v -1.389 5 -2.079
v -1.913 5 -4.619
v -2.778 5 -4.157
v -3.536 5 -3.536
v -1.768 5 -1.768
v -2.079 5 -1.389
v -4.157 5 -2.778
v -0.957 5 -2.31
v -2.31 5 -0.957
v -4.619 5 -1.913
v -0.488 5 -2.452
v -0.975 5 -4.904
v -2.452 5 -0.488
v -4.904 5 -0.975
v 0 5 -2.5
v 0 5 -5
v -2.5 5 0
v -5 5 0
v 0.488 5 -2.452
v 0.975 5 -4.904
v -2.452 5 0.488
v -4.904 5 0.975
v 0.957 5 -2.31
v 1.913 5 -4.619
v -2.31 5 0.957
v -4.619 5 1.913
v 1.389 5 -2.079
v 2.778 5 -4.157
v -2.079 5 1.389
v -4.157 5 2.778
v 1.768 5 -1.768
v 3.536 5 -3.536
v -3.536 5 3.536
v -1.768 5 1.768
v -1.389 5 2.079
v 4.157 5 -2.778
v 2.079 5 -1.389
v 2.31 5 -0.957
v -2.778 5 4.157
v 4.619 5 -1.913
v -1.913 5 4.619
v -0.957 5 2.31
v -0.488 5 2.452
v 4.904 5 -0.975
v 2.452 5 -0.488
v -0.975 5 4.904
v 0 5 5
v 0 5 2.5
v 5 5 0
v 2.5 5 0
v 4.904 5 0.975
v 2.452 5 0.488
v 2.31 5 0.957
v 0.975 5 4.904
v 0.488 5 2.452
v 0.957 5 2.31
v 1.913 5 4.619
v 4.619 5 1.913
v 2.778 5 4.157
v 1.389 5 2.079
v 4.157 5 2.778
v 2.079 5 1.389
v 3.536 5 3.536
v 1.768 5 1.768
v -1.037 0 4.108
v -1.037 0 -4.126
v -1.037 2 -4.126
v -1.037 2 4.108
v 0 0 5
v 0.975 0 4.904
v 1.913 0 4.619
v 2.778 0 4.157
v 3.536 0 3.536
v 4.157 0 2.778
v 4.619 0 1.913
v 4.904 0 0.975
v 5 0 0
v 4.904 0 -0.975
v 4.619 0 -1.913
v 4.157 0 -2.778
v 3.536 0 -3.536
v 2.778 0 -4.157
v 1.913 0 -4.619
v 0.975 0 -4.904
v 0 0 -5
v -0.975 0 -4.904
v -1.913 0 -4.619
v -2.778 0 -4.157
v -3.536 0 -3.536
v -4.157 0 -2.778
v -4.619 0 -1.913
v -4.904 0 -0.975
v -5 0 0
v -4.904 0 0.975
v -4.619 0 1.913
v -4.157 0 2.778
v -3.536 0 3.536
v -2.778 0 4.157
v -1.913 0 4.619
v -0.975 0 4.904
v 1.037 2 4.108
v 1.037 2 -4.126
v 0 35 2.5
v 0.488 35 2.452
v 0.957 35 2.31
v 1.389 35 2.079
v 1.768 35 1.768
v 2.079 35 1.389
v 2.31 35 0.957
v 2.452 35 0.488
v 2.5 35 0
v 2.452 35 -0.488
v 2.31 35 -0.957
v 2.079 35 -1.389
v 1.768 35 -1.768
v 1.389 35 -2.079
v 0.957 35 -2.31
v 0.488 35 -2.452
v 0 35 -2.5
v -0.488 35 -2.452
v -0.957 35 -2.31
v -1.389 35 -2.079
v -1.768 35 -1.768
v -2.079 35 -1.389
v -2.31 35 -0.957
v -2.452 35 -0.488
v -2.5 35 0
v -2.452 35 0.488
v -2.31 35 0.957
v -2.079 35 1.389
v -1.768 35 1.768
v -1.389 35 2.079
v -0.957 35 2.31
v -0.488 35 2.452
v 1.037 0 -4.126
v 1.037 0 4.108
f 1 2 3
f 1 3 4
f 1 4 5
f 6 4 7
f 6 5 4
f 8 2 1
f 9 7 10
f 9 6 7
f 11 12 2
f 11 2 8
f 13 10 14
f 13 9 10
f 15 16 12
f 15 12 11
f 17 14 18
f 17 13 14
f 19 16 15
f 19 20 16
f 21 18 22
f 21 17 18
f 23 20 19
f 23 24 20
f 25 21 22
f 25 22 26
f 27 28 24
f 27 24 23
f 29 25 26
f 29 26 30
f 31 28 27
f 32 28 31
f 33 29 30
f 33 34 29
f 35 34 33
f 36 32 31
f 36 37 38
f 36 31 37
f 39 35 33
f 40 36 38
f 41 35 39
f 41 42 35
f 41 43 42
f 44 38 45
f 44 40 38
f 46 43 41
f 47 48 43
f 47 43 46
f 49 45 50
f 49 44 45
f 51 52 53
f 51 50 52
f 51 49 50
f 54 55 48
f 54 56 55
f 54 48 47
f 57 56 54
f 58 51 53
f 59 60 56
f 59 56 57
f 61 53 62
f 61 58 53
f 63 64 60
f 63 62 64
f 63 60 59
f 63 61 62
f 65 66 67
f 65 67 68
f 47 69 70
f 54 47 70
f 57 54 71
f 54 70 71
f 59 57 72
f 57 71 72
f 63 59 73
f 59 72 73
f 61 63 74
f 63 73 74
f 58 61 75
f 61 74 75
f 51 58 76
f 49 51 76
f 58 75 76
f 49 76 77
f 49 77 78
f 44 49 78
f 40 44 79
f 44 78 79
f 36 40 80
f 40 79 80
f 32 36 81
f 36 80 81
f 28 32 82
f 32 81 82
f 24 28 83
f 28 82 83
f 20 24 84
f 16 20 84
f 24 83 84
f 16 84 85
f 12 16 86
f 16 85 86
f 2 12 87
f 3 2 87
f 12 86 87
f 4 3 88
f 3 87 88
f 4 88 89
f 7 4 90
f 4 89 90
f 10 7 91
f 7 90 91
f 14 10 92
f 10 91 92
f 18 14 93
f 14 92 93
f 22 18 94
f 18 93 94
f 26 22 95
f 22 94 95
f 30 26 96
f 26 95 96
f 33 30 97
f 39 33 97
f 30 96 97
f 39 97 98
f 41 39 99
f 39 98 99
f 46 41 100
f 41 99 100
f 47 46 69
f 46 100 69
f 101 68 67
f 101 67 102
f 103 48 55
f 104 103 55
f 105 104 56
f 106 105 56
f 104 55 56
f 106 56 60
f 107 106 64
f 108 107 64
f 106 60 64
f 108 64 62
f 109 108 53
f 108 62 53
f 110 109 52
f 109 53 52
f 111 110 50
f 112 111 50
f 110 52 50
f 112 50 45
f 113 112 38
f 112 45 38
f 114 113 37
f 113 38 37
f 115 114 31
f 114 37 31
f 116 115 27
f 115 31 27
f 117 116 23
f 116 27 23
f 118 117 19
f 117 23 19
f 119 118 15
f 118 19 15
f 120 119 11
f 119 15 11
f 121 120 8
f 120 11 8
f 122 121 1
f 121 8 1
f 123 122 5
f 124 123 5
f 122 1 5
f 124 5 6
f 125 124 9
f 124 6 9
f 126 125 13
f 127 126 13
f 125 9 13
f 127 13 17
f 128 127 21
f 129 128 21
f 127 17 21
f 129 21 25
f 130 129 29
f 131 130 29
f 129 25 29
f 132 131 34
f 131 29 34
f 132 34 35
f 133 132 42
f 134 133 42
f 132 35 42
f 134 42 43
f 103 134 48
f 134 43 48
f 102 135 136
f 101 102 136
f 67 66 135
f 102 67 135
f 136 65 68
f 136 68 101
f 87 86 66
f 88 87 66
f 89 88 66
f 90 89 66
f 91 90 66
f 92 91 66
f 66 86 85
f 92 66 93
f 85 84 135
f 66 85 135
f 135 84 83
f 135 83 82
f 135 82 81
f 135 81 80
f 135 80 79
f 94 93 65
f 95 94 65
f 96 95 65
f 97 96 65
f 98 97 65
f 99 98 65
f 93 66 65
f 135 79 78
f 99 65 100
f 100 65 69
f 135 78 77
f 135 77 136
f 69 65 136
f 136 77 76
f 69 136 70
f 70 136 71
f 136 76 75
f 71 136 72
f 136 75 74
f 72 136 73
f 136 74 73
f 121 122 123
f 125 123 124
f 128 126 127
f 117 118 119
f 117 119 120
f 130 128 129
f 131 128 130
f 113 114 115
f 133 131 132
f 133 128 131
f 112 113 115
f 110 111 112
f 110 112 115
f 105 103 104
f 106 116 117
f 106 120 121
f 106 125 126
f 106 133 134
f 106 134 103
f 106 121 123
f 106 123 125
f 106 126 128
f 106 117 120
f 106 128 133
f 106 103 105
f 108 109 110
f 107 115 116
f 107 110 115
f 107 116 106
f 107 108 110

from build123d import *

# Parameters (mm, degrees)
SKETCH_1_R          = 5
EXTRUDE_1_DEPTH     = 5
SKETCH_2_R          = 2.5
EXTRUDE_2_DEPTH     = 30
SKETCH_3_W          = 2.0741403
SKETCH_3_H          = 8.233435191
CUT_EXTRUDE_1_DEPTH = 2


with BuildPart() as part:
    # 草图1 → 凸台-拉伸1 (new body)
    with BuildSketch(Plane(origin=(0, 0, 0), x_dir=(1, 0, 0), z_dir=(0, 1, 0))):
        with Locations(Location((0, 0, 0), (0, 0, 270))):
            Circle(SKETCH_1_R)
    extrude(amount=EXTRUDE_1_DEPTH)

    # 草图2 → 凸台-拉伸2 (add)
    with BuildSketch(Plane(origin=(0, 5, 0), x_dir=(1, 0, 0), z_dir=(0, 1, 0))):
        with Locations(Location((0, 0, 0), (0, 0, 270))):
            Circle(SKETCH_2_R)
    extrude(amount=EXTRUDE_2_DEPTH)

    # 草图3 → 切除-拉伸1 (cut)
    with BuildSketch(Plane.XZ):
        with Locations((0, -0.009018001)):
            Rectangle(SKETCH_3_W, SKETCH_3_H)
    extrude(amount=-CUT_EXTRUDE_1_DEPTH, mode=Mode.SUBTRACT)


solid = part.part
